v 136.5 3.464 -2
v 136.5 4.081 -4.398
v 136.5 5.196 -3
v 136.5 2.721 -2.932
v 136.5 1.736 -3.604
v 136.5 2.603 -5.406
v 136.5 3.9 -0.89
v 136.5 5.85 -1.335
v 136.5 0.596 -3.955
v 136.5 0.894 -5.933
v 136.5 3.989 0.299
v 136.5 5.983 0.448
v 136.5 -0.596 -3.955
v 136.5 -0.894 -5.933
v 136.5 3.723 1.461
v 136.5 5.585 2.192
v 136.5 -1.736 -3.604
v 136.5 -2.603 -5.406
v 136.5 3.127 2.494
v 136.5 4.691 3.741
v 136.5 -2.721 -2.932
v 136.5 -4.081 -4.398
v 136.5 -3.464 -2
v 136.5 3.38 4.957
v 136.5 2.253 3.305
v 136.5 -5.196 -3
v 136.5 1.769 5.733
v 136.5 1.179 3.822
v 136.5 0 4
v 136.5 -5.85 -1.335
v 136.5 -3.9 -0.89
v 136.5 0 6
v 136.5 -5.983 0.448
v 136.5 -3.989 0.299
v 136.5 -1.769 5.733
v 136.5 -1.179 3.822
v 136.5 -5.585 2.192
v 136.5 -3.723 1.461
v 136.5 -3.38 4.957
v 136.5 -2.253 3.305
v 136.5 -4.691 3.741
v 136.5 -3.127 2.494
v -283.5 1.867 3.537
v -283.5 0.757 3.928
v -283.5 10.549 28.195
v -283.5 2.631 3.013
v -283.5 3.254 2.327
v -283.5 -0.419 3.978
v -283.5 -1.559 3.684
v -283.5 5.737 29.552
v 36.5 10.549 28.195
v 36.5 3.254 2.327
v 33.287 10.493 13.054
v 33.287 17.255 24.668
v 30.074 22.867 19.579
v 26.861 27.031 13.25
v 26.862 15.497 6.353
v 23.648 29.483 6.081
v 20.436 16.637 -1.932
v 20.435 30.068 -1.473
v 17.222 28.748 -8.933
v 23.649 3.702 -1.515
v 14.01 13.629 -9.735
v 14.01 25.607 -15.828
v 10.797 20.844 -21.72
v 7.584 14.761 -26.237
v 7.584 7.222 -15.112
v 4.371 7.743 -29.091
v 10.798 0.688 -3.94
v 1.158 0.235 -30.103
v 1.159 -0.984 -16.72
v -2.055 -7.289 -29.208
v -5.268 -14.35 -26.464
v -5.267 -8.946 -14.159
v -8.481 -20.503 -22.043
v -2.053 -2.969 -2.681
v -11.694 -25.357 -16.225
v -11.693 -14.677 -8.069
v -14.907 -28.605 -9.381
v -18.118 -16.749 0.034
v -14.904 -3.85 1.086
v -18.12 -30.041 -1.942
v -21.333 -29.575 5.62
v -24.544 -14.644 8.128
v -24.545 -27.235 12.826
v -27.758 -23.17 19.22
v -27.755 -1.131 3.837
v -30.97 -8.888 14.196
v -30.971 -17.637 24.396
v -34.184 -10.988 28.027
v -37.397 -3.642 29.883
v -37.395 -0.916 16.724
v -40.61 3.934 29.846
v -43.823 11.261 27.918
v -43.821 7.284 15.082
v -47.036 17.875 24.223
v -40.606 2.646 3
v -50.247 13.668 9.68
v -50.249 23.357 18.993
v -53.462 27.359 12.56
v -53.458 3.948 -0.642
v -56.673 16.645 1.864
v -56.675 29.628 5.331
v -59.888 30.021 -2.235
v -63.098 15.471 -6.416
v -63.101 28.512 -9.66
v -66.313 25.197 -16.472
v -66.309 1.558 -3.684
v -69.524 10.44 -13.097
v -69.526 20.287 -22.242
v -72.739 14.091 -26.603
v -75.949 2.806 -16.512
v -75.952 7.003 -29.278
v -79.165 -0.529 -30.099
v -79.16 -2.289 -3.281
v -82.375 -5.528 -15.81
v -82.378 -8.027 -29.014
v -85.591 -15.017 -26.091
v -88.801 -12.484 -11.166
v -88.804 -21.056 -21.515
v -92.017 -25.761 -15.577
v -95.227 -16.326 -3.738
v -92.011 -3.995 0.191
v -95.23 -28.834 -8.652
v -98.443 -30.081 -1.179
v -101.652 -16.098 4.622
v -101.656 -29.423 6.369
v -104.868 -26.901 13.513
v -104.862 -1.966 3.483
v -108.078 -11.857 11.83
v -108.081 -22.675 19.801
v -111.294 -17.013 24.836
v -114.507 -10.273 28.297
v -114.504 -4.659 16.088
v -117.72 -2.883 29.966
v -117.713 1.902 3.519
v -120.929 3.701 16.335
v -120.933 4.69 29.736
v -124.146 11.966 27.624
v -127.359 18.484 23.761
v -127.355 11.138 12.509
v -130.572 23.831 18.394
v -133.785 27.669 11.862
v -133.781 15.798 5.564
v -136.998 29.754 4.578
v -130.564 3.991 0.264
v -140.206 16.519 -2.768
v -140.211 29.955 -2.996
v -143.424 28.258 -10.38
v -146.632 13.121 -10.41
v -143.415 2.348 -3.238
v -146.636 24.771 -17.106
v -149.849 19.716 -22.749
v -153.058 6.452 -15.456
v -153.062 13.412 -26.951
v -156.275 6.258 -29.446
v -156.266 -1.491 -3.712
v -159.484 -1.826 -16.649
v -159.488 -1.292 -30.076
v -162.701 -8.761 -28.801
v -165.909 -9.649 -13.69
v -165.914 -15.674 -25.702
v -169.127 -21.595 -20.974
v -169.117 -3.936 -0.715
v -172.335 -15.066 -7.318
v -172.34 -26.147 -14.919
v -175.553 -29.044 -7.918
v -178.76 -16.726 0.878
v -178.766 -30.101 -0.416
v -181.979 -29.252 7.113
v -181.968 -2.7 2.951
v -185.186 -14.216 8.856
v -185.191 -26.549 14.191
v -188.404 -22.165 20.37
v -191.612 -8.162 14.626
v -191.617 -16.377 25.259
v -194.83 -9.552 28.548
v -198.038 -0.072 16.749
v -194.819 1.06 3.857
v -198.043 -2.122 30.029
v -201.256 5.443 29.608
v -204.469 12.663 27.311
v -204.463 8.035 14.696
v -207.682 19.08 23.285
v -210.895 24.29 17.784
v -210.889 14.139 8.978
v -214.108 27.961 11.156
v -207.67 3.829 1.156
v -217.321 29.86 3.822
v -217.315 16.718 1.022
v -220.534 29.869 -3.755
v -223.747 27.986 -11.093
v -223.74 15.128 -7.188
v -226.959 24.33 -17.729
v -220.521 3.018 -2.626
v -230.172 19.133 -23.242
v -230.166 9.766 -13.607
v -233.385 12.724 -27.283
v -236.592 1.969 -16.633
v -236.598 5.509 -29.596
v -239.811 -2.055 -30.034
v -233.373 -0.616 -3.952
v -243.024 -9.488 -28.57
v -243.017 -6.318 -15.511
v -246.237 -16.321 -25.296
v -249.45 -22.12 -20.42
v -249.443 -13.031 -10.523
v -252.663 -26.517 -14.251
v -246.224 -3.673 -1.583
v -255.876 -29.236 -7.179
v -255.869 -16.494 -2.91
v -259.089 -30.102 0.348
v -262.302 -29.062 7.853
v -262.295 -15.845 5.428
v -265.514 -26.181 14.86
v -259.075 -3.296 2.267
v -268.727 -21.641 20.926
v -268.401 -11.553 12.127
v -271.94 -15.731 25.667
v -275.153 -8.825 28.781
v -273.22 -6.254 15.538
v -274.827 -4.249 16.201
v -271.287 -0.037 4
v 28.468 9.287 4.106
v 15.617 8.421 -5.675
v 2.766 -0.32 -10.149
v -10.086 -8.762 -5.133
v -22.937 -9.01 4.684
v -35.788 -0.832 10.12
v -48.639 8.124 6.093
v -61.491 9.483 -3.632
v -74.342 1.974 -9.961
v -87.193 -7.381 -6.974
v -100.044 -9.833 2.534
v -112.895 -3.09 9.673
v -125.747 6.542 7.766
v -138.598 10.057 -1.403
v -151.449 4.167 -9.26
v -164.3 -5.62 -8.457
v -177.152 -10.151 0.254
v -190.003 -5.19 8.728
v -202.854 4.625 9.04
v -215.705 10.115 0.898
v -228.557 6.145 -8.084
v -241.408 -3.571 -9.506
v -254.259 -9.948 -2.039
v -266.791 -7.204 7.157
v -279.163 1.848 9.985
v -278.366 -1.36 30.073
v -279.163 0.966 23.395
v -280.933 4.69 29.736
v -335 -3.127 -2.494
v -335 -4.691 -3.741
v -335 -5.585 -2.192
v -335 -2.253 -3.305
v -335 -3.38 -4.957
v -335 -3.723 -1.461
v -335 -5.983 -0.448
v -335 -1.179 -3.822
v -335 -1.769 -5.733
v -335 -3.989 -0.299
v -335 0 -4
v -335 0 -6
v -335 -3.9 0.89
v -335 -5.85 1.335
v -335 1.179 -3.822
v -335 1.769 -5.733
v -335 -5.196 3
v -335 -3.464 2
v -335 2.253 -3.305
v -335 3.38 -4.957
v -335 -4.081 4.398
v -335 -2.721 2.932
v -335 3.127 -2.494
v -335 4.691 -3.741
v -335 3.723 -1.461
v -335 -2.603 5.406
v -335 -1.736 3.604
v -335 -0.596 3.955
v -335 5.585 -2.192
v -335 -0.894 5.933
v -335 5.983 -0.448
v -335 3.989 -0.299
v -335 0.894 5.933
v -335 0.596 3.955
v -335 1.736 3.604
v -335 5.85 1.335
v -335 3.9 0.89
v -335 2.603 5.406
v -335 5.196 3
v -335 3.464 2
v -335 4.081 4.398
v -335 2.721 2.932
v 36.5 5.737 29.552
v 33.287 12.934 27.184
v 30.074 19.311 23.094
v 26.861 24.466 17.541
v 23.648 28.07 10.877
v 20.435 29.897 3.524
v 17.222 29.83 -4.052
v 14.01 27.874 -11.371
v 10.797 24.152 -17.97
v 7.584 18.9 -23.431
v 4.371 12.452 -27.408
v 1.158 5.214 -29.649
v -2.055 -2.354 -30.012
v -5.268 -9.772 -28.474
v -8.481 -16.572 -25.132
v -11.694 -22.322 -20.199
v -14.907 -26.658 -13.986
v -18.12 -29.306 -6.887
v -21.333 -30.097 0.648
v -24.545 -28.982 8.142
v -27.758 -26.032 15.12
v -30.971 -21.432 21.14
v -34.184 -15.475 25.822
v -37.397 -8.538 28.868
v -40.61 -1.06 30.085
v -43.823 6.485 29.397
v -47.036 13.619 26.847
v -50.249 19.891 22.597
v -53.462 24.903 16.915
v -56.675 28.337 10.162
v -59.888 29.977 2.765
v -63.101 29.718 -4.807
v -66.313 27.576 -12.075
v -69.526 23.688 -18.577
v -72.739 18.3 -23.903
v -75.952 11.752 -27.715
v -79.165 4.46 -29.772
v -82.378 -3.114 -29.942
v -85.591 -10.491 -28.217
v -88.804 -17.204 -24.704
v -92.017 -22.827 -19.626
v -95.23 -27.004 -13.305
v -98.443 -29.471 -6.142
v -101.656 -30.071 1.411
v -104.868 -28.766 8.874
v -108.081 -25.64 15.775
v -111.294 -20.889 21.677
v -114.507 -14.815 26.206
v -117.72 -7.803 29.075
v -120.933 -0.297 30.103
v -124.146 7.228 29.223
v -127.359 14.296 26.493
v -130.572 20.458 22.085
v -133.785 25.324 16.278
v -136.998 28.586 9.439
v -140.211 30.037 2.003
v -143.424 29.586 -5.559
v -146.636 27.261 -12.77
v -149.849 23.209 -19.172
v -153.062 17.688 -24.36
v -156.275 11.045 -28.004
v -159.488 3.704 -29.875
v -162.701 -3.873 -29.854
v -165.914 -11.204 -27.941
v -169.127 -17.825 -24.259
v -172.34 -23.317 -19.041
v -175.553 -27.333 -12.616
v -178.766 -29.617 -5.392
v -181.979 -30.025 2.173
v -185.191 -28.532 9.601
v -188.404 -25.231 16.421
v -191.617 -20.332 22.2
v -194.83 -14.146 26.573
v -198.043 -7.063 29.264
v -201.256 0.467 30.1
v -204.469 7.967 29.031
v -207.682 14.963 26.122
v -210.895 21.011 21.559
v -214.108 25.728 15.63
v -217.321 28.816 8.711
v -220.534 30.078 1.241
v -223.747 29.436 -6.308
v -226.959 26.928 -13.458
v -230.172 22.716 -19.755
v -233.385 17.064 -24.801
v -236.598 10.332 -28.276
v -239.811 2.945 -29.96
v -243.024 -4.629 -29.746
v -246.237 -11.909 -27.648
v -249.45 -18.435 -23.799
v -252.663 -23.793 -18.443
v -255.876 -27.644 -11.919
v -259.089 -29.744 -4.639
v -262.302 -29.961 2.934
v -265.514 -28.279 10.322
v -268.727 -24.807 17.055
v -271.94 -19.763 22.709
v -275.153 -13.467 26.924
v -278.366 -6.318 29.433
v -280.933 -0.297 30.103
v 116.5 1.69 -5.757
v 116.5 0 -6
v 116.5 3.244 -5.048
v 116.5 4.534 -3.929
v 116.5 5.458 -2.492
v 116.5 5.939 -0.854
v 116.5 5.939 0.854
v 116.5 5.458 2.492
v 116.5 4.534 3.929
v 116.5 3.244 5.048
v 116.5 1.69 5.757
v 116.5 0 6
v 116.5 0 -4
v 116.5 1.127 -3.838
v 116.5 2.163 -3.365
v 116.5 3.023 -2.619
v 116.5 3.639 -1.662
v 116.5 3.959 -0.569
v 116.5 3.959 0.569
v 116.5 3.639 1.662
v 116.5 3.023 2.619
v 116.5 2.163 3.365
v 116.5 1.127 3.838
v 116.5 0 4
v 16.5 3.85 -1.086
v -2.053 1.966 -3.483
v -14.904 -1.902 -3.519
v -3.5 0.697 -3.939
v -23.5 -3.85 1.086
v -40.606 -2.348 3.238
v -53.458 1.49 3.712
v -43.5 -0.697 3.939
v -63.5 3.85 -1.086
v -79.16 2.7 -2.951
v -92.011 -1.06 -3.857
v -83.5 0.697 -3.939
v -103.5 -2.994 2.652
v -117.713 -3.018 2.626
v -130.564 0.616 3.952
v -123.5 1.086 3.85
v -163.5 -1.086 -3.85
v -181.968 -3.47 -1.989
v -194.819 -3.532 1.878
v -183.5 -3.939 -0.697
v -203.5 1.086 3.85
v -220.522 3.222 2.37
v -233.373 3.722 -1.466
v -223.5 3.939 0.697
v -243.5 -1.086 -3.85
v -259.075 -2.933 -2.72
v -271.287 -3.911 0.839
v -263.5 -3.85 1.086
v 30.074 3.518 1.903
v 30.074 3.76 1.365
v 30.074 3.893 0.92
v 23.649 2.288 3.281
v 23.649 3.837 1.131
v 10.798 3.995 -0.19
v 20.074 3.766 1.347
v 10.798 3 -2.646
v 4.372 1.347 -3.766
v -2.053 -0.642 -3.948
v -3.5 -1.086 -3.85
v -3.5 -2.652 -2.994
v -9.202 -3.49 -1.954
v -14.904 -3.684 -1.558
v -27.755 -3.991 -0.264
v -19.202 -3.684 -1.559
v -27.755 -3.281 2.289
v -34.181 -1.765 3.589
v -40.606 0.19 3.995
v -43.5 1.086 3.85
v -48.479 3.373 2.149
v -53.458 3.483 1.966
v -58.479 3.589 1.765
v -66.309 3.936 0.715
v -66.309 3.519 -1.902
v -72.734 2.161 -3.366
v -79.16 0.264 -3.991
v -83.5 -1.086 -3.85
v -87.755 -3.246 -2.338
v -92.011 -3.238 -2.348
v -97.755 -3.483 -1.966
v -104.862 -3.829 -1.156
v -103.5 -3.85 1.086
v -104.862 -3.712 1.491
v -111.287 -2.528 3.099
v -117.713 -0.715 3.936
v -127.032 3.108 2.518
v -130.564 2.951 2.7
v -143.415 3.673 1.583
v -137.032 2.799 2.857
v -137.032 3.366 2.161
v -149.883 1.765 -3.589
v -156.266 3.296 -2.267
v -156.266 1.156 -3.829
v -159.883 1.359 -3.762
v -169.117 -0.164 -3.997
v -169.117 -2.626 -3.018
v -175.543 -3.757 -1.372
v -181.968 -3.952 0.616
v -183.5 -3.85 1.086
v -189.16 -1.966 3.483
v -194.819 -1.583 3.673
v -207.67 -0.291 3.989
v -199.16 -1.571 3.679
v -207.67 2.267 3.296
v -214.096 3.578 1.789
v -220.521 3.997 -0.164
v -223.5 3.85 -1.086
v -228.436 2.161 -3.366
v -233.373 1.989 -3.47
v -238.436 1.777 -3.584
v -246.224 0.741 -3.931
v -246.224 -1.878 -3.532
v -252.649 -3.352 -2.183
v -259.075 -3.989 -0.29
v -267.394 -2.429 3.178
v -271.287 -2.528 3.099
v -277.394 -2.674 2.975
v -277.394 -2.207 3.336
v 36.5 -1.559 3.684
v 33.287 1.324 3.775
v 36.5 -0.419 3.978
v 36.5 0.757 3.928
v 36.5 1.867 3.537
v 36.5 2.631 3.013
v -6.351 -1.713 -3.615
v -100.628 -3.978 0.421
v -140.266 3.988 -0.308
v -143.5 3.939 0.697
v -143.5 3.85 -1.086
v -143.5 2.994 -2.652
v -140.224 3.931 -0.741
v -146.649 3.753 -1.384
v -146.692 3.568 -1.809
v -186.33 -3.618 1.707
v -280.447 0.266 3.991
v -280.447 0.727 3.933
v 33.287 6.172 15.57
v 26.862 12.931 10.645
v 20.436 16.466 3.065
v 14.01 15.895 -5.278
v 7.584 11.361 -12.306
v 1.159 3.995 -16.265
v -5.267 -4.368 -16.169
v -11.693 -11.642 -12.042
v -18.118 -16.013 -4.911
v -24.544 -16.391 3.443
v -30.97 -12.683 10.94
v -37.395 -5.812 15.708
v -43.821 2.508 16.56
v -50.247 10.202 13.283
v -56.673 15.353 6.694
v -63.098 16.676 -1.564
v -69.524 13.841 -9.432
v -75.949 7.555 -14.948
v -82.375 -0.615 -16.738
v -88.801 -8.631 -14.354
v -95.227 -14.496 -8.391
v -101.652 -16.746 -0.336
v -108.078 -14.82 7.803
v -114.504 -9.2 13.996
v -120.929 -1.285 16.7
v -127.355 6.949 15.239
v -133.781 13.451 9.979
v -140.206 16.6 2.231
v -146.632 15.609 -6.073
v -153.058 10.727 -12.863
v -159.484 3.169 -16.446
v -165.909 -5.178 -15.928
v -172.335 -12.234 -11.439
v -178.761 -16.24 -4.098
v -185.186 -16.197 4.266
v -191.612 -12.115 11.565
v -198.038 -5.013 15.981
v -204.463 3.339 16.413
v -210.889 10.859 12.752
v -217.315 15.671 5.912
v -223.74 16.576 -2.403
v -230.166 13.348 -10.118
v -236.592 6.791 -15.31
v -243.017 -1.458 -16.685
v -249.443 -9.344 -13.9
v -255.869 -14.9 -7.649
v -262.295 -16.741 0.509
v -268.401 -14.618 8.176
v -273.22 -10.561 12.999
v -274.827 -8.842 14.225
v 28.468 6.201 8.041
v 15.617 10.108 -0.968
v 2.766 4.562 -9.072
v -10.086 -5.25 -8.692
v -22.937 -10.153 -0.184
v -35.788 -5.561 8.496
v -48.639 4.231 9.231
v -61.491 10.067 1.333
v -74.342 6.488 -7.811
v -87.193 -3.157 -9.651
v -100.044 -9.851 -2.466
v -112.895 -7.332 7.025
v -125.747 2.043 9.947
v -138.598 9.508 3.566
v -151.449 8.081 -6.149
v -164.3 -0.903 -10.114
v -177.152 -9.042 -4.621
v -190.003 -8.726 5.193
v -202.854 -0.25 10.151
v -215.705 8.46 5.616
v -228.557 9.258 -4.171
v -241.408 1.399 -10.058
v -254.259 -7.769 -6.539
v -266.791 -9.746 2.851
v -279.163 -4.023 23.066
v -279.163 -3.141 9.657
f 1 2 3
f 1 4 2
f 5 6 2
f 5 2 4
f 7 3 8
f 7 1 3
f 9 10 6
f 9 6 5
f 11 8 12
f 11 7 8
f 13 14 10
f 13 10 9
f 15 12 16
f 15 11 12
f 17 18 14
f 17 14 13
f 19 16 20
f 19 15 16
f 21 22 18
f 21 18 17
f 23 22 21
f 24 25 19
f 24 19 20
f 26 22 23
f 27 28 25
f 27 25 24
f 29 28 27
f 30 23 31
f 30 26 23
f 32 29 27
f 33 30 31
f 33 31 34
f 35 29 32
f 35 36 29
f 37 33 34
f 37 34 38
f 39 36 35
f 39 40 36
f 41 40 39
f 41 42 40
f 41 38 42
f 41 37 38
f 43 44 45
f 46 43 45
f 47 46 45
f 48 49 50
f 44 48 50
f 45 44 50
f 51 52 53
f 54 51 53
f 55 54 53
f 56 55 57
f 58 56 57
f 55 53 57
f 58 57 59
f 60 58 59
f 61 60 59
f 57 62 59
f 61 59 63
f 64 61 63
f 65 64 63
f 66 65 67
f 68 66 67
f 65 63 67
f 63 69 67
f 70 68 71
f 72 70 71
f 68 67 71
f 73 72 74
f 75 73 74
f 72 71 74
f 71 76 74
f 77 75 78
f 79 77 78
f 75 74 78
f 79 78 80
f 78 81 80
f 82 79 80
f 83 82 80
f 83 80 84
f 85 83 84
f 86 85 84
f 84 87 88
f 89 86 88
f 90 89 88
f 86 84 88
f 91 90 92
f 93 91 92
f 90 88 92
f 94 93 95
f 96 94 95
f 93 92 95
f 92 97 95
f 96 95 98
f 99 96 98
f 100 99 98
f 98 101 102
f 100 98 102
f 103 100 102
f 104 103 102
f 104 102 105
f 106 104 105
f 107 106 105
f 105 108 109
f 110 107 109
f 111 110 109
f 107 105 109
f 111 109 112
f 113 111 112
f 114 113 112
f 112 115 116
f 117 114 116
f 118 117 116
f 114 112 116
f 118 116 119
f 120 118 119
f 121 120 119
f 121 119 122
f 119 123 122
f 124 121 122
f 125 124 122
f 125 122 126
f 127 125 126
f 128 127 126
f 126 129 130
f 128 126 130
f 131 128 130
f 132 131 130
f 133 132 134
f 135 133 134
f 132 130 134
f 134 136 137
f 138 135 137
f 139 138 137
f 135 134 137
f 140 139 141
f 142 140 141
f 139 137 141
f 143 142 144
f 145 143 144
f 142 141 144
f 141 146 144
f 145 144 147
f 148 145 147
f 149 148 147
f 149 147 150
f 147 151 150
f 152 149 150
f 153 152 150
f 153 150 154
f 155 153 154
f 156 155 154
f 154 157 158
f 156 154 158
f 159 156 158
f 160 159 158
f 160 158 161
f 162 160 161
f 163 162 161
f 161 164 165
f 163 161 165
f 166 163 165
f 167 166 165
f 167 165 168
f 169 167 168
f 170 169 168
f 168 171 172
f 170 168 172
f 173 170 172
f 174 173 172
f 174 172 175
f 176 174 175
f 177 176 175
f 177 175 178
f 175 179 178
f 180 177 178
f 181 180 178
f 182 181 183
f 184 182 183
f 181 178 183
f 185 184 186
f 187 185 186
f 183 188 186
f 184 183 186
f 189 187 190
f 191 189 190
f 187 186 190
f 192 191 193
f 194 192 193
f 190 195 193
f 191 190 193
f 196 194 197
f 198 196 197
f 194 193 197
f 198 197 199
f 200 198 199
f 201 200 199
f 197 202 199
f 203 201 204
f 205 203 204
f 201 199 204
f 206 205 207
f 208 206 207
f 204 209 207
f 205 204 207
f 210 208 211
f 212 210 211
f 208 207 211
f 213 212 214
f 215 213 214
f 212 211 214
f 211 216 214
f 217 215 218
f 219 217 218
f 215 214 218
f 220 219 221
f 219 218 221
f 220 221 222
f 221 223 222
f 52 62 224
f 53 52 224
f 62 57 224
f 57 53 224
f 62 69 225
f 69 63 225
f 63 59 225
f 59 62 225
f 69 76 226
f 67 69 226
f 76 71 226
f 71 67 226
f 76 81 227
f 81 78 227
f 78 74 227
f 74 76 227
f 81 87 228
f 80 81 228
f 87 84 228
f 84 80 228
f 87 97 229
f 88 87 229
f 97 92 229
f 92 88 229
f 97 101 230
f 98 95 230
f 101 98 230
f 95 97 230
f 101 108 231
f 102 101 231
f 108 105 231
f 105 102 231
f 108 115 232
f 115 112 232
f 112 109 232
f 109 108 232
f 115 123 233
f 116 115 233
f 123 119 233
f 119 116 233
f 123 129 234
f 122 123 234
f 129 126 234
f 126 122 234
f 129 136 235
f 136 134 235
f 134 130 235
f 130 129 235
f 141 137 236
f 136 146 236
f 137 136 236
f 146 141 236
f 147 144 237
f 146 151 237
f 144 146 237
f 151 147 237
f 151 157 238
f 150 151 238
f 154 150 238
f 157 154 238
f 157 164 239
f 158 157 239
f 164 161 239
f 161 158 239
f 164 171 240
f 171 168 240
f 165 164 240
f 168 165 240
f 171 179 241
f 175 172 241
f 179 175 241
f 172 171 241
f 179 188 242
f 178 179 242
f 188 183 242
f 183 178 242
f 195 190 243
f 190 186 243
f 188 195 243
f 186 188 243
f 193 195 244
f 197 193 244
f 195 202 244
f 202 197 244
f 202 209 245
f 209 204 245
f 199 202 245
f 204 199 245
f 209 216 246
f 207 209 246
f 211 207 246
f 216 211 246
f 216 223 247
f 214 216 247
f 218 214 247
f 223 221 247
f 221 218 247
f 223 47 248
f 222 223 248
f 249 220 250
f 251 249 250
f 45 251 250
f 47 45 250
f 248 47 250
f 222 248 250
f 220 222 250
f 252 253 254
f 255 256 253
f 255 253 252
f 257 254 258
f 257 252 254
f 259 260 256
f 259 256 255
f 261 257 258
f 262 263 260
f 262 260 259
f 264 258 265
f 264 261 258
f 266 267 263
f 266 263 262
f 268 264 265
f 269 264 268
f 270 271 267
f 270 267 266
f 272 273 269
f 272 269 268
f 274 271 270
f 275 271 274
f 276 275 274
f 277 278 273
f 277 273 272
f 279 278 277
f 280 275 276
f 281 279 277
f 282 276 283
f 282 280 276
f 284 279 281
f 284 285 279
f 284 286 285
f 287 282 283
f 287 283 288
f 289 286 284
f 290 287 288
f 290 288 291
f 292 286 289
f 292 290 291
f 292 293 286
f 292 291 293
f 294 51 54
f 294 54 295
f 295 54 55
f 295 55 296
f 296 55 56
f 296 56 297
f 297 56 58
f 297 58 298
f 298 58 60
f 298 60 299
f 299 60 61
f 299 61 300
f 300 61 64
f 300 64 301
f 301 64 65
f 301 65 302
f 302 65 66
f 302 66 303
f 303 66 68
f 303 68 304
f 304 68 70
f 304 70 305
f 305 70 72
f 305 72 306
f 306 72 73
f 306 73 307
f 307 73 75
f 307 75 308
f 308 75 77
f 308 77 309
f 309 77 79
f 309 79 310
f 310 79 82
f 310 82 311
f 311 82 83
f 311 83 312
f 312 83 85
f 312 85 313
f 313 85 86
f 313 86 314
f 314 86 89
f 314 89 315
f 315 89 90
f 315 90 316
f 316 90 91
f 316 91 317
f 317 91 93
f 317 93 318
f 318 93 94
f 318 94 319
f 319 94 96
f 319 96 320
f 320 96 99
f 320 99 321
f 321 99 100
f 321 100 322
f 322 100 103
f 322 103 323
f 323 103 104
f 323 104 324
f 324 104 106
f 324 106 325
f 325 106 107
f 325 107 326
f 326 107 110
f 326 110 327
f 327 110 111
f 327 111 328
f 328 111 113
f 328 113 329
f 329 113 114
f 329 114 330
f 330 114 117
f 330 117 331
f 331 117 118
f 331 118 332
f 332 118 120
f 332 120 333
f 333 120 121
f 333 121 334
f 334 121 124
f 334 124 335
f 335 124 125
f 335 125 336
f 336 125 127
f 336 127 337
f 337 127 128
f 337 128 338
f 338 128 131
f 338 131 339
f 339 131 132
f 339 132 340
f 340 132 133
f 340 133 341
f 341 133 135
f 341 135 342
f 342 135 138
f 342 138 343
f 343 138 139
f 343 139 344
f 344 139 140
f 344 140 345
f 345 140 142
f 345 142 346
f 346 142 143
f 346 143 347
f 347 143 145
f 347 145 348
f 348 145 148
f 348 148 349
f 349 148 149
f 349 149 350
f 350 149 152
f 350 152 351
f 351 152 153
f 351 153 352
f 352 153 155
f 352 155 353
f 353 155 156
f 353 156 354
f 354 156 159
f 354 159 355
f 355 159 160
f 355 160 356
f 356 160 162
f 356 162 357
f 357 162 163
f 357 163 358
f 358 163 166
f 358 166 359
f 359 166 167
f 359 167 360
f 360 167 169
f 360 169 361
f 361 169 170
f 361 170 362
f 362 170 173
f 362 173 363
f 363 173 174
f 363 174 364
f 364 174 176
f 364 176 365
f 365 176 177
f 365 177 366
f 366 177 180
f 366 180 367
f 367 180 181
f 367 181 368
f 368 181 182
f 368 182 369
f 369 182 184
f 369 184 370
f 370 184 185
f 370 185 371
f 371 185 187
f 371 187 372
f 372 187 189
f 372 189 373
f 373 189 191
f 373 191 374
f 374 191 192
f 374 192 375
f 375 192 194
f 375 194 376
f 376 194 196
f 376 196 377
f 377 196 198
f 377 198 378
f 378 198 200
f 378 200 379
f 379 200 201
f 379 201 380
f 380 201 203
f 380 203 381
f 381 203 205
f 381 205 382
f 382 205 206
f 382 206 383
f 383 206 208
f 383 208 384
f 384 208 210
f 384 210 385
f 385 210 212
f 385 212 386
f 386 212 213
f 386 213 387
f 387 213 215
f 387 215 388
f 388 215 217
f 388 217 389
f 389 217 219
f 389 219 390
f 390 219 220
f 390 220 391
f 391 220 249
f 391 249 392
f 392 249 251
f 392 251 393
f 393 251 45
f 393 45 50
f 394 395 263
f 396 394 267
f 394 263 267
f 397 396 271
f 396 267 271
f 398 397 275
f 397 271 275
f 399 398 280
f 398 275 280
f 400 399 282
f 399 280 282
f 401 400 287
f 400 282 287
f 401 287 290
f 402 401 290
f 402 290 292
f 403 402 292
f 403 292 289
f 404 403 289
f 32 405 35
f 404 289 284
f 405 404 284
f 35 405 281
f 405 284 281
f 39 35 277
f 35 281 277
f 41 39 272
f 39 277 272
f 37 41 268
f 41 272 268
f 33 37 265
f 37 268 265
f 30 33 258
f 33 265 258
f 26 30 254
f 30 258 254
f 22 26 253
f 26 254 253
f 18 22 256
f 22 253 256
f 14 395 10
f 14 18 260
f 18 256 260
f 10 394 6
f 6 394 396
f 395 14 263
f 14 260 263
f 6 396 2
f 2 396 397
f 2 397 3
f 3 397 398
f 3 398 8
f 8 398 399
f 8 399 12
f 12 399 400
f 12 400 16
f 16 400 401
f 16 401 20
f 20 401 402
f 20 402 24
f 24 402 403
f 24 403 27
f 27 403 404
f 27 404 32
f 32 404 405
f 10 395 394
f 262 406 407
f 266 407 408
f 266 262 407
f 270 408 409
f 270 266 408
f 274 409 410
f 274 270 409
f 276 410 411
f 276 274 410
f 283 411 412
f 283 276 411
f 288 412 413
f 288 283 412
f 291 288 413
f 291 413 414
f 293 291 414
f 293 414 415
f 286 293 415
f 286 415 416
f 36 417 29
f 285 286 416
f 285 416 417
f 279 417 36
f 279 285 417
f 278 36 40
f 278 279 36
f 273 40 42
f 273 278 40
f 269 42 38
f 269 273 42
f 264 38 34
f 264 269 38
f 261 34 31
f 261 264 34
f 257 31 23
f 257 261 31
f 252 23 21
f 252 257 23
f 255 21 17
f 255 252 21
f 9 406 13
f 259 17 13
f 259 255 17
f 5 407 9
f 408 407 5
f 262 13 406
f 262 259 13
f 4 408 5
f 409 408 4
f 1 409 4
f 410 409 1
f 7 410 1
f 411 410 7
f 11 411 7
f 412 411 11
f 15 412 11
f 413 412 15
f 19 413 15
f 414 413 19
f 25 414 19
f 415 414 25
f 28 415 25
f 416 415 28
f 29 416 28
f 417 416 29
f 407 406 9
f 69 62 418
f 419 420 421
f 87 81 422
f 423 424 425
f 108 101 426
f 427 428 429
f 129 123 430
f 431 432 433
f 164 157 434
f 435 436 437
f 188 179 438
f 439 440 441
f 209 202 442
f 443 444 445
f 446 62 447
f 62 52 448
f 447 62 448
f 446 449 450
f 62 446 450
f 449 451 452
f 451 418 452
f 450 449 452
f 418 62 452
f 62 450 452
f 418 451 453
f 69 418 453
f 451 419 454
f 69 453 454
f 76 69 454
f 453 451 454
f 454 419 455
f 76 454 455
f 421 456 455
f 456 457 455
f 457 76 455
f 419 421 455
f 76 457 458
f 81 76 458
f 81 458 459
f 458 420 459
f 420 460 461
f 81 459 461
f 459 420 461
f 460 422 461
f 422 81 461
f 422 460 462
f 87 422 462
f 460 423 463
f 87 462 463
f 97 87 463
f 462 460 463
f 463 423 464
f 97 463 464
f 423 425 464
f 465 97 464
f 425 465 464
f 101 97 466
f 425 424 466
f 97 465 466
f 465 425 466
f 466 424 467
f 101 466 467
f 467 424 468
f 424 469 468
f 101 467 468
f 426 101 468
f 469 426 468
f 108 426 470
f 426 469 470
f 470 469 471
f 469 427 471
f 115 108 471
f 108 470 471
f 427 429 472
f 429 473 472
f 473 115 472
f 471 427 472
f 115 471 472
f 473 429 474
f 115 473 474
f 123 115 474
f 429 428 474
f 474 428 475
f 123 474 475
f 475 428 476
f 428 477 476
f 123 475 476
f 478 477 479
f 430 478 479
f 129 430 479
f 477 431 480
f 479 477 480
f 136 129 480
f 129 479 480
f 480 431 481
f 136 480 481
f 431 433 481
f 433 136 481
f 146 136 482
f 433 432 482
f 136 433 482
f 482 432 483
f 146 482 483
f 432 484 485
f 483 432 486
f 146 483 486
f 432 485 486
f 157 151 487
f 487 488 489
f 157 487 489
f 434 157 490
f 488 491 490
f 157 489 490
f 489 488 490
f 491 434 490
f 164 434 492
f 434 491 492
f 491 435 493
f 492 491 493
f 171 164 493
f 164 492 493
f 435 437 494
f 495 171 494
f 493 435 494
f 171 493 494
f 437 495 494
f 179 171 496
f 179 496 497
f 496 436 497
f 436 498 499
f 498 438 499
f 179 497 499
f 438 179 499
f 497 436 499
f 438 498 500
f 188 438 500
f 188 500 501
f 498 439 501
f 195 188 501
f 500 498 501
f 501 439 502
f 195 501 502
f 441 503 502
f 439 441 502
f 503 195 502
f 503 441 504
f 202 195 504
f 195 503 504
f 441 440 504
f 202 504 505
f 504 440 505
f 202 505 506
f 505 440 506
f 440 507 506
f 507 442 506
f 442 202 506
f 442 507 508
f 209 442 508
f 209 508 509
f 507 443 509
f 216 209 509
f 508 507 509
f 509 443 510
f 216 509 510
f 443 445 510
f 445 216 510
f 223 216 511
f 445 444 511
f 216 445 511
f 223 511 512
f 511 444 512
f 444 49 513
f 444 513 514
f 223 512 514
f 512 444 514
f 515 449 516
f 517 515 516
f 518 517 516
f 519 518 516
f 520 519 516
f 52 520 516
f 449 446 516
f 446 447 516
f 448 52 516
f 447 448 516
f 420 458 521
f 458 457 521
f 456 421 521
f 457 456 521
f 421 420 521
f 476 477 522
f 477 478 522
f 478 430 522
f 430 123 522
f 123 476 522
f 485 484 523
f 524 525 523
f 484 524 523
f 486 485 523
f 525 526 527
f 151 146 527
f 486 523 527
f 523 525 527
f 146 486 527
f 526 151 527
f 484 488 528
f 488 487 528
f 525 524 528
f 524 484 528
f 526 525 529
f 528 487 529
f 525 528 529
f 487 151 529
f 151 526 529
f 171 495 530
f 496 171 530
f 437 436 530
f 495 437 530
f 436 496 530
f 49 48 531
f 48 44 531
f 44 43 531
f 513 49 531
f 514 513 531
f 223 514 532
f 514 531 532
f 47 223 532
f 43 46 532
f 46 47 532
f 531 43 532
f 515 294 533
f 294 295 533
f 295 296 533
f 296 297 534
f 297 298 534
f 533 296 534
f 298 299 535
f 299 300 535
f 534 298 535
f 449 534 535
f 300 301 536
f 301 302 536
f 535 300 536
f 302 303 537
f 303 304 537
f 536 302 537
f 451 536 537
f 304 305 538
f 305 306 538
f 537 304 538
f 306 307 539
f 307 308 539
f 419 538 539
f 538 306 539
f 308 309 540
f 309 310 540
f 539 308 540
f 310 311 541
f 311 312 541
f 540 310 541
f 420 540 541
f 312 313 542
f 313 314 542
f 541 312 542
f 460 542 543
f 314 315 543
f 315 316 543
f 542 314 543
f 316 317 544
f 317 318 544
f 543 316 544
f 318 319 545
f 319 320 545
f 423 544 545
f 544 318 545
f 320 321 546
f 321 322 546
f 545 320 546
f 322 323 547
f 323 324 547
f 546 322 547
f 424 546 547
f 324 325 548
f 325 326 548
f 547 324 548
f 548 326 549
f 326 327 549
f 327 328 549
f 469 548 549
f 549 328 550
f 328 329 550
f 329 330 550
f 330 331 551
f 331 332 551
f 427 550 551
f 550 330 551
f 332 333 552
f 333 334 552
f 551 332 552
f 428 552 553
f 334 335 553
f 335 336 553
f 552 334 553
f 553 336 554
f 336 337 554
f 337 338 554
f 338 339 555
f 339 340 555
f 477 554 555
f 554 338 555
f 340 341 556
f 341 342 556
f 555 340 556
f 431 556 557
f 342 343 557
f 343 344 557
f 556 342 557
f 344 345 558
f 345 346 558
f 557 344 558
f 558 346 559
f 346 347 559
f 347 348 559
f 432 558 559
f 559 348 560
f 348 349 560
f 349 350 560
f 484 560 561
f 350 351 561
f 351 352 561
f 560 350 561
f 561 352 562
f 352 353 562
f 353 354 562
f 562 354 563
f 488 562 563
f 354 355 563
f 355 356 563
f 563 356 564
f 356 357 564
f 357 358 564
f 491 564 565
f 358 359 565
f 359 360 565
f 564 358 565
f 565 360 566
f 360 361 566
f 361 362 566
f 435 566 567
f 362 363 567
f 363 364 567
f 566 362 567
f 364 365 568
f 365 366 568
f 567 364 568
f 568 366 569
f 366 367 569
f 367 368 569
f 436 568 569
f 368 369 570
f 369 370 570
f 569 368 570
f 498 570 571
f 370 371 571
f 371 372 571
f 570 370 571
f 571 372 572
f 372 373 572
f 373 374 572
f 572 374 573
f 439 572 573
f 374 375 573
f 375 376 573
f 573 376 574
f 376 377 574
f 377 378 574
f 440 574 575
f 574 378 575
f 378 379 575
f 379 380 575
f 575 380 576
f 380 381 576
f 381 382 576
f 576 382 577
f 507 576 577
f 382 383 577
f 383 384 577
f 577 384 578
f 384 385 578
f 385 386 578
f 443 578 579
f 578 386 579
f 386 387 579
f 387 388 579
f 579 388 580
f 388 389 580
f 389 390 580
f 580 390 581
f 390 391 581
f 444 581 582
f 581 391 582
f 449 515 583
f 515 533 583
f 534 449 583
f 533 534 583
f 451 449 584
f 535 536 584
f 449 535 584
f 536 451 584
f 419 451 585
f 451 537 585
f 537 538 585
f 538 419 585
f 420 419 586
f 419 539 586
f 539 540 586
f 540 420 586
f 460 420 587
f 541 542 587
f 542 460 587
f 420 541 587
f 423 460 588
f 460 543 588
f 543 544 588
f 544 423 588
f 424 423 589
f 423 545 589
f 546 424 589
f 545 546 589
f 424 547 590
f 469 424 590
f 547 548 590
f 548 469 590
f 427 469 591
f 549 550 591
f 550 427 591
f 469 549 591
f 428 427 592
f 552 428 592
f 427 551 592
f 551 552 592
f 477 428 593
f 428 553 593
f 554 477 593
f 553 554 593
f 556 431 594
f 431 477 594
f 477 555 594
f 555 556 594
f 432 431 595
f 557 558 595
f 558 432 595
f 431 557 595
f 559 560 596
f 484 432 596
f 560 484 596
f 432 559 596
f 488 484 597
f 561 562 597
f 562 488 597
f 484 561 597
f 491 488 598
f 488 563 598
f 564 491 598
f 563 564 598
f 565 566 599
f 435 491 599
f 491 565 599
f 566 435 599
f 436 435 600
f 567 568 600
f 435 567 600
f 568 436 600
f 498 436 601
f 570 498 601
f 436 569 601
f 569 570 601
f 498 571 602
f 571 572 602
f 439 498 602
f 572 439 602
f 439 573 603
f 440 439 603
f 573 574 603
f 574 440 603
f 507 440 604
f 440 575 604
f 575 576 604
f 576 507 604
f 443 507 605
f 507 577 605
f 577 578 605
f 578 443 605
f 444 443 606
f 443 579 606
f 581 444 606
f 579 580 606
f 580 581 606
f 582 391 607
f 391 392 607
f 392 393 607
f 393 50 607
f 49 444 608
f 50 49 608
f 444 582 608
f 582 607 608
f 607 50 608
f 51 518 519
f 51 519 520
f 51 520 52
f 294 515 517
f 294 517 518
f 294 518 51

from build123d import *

# Parameters (mm, degrees)
AUFSATZ_LINEAR_AUSTRAGEN1_DEPTH      = 51.5
AUFSATZ_LINEAR_AUSTRAGEN1_DEPTH_BACK = 415
SKIZZE3_R                            = 6
SKIZZE3_R_2                          = 4
AUSTRAGUNG1_PITCH                    = 80
AUSTRAGUNG1_HEIGHT                   = 320
AUSTRAGUNG1_RADIUS                   = 4
SKETCH1_R                            = 6
SKETCH1_R_2                          = 4
BOSS_EXTRUDE1_DEPTH                  = 65
SKETCH2_R                            = 6
CUT_EXTRUDE1_DEPTH                   = 80
SKETCH3_R                            = 6
SKETCH3_R_2                          = 4
BOSS_EXTRUDE2_DEPTH                  = 20


with BuildPart() as part:
    # Skizze3 → Aufsatz-Linear austragen1 (new, two sides: drawn at the far end of the back side and taken through both)
    with BuildSketch(Plane(origin=(0, 0, 0), x_dir=(0, 0, -1), z_dir=(1, 0, 0)).offset(-AUFSATZ_LINEAR_AUSTRAGEN1_DEPTH_BACK)):
        Circle(SKIZZE3_R)
        Circle(SKIZZE3_R_2, mode=Mode.SUBTRACT)
    extrude(amount=AUFSATZ_LINEAR_AUSTRAGEN1_DEPTH + AUFSATZ_LINEAR_AUSTRAGEN1_DEPTH_BACK)

    # Sketch1 → Boss-Extrude1 (add)
    with BuildSketch(Plane(origin=(51.5, 0, 0), x_dir=(0, 0, -1), z_dir=(1, 0, 0))):
        Circle(SKETCH1_R)
        Circle(SKETCH1_R_2, mode=Mode.SUBTRACT)
    extrude(amount=BOSS_EXTRUDE1_DEPTH)

    # Sketch2 → Cut-Extrude1 (cut)
    with BuildSketch(Plane.ZY.offset(415)):
        Circle(SKETCH2_R)
    extrude(amount=-CUT_EXTRUDE1_DEPTH, mode=Mode.SUBTRACT)

    # Sketch3 → Boss-Extrude2 (add)
    with BuildSketch(Plane(origin=(116.5, 0, 0), x_dir=(0, 0, -1), z_dir=(1, 0, 0))):
        with Locations(Location((0, 0, 0), (0, 0, 180))):
            Circle(SKETCH3_R)
        with Locations(Location((0, 0, 0), (0, 0, 180))):
            Circle(SKETCH3_R_2, mode=Mode.SUBTRACT)
    extrude(amount=BOSS_EXTRUDE2_DEPTH)


with BuildPart() as body_2:
    # Austragung1: sweep along a helix
    with BuildLine() as austragung1_path:
        Helix(AUSTRAGUNG1_PITCH, AUSTRAGUNG1_HEIGHT, AUSTRAGUNG1_RADIUS, center=(36.5, 0, 0), direction=(-1, 0, 0))
    # Skizze2 → Austragung1 (sweep)
    with BuildSketch(Plane(origin=(0, 0, 0), x_dir=(0, 0, -1), z_dir=(1, 0, 0))):
        with BuildLine():
            Line((3.122498999, -2.5), (30, -2.5))
            Line((30, -2.5), (30, 2.5))
            Line((30, 2.5), (3.122498999, 2.5))
            ThreePointArc((3.122498999, 2.5), (4, 0), (3.122498999, -2.5))
        make_face()
    sweep(path=austragung1_path.line, is_frenet=True)


solid = Compound([part.part, body_2.part])
